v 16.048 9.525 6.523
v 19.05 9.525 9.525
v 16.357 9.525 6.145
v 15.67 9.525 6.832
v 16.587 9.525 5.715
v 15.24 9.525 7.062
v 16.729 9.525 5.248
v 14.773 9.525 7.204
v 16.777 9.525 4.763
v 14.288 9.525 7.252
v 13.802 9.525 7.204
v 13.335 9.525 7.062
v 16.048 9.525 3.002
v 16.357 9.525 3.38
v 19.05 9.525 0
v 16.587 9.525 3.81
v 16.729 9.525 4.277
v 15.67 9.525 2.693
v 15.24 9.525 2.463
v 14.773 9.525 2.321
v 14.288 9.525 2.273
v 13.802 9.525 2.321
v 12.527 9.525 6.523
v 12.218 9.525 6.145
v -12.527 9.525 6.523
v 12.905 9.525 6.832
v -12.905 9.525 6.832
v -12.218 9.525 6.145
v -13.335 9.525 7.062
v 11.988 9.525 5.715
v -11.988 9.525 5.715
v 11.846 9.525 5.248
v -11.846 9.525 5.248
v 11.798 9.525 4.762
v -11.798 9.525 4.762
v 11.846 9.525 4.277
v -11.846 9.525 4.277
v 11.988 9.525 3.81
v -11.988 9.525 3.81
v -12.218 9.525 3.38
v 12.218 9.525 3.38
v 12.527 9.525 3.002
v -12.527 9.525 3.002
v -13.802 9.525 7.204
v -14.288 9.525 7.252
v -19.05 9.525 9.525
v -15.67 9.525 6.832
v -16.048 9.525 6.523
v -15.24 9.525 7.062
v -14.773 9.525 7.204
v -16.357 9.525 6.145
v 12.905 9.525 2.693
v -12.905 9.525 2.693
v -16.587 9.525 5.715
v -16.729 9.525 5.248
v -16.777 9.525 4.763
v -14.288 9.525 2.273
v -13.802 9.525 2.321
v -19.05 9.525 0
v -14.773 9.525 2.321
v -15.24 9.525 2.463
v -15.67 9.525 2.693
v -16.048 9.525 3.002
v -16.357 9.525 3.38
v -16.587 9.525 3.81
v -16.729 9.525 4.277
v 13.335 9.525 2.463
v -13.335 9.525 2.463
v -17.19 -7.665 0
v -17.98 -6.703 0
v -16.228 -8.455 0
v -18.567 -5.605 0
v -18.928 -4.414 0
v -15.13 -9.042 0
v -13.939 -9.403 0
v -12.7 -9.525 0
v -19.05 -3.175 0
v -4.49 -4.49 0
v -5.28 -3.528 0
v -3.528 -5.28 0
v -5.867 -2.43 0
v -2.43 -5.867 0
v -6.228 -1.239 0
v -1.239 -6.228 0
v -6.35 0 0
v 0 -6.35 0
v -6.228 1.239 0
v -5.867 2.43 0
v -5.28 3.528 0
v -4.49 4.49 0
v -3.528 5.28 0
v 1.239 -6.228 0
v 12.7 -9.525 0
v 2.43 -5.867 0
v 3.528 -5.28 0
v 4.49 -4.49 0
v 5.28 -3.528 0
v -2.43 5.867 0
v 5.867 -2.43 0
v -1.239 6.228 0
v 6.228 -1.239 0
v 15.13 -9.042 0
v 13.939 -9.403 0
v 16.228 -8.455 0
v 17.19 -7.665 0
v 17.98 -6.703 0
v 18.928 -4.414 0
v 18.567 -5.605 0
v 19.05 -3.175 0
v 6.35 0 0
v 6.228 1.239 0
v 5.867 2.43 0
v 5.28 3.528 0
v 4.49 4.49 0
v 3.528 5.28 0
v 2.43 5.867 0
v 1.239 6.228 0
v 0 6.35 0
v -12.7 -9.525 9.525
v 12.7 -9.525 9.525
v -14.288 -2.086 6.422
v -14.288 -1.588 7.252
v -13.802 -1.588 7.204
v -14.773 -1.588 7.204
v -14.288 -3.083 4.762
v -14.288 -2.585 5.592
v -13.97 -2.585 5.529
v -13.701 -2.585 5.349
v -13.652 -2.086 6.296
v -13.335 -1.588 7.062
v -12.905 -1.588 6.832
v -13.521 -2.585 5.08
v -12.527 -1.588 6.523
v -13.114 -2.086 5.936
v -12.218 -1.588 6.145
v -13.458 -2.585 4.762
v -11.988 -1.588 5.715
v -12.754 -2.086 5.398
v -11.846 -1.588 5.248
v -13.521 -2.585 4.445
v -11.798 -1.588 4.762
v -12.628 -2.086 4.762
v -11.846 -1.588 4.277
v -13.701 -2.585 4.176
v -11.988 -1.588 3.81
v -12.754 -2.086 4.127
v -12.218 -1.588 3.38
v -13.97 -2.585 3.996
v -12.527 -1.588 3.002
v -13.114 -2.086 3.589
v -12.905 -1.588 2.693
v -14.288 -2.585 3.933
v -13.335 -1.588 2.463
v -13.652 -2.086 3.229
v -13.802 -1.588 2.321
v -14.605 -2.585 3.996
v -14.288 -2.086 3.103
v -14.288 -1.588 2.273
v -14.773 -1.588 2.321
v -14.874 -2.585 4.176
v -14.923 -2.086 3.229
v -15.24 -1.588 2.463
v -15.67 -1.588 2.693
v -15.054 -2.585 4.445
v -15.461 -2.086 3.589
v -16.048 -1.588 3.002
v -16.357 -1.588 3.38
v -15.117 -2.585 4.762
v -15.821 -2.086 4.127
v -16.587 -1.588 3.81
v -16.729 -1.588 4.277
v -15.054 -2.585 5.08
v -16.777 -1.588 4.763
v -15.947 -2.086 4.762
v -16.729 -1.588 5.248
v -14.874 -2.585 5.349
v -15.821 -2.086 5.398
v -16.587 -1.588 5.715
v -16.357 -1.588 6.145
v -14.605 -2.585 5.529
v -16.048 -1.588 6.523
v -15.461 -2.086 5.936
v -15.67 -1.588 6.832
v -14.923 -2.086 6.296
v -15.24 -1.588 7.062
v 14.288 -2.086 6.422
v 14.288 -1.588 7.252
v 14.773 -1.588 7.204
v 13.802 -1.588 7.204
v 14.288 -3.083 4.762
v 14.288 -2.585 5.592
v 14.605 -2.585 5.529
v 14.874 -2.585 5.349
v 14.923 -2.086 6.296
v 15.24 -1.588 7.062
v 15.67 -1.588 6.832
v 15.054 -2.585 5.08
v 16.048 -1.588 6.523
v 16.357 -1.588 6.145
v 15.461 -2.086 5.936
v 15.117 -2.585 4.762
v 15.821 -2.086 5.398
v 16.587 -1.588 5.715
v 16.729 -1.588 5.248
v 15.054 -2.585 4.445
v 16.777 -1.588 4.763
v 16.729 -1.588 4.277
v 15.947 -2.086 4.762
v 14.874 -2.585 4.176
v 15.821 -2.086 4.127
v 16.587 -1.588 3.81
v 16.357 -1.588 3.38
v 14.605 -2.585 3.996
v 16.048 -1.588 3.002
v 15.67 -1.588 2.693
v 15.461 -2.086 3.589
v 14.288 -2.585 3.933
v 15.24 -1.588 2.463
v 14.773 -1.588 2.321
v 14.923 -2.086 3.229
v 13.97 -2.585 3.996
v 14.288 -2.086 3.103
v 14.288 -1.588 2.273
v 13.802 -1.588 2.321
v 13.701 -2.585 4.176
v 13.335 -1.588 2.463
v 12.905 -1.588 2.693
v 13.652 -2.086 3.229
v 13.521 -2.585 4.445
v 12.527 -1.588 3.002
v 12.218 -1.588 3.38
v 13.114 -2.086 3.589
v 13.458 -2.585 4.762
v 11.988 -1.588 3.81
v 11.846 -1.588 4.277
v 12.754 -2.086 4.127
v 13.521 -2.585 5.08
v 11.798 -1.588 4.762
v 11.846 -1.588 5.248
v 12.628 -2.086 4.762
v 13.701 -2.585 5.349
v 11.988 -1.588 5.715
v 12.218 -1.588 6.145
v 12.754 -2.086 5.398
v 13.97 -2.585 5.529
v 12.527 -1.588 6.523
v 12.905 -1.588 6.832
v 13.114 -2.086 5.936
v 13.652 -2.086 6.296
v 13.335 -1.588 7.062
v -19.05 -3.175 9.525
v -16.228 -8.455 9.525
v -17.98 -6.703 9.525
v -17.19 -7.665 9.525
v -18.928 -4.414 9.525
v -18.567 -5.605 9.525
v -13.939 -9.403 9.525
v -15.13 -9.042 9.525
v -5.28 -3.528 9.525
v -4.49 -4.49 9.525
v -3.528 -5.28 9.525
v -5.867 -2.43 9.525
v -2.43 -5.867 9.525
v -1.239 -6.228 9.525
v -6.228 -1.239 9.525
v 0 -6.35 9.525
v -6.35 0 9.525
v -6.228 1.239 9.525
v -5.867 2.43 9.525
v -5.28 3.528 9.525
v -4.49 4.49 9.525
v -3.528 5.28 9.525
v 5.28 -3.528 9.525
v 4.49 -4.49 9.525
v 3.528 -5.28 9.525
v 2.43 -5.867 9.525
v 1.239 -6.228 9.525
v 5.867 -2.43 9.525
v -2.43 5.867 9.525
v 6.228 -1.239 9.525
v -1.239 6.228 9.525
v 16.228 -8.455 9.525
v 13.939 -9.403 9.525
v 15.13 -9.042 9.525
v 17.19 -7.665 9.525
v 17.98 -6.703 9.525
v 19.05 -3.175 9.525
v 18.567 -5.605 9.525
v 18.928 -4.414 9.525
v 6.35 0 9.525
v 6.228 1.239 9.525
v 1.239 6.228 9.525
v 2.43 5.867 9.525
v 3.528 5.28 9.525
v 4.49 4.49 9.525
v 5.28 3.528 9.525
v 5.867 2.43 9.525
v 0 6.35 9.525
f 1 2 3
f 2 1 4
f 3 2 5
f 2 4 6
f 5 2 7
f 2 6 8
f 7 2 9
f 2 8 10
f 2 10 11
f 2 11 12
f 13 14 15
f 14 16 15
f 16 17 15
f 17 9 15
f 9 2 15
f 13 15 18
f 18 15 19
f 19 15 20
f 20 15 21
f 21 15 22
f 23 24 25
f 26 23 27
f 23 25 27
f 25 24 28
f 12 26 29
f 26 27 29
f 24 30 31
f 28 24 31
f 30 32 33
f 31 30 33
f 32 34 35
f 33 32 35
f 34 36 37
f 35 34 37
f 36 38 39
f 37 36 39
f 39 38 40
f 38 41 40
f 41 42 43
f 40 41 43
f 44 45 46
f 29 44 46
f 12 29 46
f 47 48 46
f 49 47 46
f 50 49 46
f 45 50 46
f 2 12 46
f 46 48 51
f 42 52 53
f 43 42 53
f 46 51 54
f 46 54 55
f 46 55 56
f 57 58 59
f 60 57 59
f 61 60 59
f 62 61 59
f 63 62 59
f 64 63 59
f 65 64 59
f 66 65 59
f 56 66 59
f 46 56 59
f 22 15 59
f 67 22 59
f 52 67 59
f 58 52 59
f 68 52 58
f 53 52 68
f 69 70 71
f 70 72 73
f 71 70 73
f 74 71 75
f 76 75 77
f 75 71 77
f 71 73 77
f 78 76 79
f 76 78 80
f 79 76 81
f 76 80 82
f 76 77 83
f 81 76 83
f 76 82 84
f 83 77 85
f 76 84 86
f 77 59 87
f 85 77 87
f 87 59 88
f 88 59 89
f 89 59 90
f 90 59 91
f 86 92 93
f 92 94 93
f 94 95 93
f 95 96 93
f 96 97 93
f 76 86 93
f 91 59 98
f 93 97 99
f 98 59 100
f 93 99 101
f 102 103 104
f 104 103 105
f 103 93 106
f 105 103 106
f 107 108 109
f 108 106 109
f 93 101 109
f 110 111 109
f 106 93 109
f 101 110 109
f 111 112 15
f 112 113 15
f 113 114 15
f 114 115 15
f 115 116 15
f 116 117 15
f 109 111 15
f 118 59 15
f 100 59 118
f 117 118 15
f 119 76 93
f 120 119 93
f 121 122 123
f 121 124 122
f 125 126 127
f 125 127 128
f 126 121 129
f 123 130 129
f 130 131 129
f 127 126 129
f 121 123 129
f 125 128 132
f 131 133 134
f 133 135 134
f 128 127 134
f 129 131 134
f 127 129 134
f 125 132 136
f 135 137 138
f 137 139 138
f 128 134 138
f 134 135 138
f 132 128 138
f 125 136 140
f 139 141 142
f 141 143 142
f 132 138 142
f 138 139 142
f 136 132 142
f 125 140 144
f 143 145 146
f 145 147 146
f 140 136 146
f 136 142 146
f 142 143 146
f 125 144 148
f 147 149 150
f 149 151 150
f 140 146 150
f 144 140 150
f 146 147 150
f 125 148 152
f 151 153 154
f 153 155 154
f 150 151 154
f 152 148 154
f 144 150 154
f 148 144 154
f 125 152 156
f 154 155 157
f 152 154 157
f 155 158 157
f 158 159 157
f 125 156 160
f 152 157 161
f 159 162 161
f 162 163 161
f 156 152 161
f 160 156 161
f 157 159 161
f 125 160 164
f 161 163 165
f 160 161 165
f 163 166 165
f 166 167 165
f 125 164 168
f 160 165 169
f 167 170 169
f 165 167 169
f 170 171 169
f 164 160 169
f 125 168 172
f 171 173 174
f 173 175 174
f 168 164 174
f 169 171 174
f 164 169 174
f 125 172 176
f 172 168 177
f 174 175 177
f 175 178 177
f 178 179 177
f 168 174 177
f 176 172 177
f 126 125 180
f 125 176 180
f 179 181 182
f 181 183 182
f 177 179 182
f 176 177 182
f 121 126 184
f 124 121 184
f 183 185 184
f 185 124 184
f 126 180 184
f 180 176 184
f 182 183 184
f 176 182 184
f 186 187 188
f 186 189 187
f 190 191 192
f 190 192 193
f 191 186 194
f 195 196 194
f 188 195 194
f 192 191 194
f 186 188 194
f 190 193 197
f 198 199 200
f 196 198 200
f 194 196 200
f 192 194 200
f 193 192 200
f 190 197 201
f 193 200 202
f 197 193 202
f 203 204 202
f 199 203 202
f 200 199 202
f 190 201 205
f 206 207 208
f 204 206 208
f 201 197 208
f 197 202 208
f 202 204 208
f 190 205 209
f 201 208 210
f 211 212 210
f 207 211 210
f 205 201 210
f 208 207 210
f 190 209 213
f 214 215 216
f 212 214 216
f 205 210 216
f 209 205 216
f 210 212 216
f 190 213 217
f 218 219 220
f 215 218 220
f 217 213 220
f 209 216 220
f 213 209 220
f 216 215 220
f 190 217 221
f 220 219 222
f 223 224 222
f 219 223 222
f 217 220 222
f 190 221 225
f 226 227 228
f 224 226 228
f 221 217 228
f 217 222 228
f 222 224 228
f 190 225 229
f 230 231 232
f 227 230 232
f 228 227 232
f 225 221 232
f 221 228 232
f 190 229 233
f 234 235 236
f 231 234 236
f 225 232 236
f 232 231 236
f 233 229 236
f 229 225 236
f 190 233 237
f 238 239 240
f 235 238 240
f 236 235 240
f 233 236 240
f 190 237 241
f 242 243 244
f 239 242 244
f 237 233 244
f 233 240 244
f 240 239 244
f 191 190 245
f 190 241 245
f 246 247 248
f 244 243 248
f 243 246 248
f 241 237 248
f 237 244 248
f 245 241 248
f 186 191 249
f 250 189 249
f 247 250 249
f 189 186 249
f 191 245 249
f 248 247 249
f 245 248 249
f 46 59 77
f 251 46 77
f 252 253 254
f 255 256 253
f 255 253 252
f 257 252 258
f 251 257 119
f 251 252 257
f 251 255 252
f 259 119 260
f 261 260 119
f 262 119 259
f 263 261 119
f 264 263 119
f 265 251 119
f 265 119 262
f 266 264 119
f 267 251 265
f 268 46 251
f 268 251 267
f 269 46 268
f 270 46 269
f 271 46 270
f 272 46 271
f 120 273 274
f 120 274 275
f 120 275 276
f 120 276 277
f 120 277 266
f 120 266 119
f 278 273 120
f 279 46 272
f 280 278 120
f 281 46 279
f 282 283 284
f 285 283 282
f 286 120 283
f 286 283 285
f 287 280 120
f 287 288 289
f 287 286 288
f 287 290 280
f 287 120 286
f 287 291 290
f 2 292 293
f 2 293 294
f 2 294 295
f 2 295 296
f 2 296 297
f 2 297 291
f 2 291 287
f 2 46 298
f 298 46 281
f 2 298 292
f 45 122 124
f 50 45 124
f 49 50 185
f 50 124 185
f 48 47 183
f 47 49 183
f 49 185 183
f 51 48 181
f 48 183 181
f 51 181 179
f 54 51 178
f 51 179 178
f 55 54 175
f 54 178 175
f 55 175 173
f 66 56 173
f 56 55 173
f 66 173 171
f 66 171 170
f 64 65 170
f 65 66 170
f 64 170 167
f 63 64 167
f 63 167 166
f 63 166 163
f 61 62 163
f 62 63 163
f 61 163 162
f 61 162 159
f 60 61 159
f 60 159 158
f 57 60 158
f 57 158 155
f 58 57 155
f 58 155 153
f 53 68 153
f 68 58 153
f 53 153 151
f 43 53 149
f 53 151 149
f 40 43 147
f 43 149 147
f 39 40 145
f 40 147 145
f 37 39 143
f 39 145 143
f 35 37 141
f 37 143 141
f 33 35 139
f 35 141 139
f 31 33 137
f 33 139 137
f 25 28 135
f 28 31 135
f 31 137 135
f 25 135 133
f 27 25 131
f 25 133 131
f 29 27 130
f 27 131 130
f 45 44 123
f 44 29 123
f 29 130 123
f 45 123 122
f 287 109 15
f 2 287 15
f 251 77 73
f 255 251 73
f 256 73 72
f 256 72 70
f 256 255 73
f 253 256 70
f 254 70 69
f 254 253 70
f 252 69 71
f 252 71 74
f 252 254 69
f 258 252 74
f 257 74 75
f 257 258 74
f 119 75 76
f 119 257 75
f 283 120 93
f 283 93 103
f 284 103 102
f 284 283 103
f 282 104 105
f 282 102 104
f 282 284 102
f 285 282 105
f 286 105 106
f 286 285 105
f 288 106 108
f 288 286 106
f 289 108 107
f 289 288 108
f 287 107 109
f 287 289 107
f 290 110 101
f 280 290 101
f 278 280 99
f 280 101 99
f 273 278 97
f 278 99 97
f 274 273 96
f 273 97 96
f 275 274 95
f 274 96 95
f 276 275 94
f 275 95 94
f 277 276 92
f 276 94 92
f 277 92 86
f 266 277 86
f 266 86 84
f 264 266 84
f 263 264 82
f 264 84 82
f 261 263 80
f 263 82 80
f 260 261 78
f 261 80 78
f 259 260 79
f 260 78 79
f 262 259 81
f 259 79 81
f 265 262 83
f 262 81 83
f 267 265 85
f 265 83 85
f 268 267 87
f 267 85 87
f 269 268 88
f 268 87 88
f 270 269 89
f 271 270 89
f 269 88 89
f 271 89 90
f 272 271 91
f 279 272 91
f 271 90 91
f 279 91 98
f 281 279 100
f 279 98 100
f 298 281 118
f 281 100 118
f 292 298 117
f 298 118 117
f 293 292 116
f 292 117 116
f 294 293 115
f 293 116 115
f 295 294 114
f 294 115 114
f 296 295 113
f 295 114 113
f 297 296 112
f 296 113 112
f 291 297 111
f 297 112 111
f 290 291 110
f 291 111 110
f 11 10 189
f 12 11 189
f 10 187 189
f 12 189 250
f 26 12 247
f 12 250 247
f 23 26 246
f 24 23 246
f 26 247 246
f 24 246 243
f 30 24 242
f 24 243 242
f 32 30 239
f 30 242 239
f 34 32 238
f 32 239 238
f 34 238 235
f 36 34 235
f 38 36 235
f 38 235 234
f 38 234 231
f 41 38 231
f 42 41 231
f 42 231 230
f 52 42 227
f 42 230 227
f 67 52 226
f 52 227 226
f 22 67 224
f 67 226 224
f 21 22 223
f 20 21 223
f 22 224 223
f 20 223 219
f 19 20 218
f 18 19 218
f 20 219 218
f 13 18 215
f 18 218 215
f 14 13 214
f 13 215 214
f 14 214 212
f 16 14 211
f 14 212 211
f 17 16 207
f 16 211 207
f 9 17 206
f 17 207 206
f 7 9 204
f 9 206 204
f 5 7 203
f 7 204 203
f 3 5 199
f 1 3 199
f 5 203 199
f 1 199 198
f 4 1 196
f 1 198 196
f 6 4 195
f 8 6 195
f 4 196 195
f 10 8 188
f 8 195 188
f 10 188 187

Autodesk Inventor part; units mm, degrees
ref_plane "YZ Plane" through (0, 0, 0) normal (1, 0, 0) x (0, 1, 0)
ref_plane "XZ Plane" through (0, 0, 0) normal (0, 1, 0) x (-1, 0, 0)
ref_plane "XY Plane" through (0, 0, 0) normal (0, 0, 1) x (1, 0, 0)
sketch "Sketch1" plane through (0, 0, 0) normal (0, 0, 1) x (1, 0, 0)
  circle A0 centre (0, 0) radius 6.35
  arc A1 (0, 9.525) -> (0, -9.525) centre (0, 0) ccw
  line L0 (0, -9.525) -> (19.05, -9.525)
  line L1 (19.05, -9.525) -> (19.05, 9.525)
  line L2 (19.05, 9.525) -> (0, 9.525)
  dimension "d0" = 12.7
  dimension "d1" = 19.05
  dimension "d2" = 19.05
  dimension "d3" = 19.05
extrude "Extrusion1" add sketch "Sketch1" along normal blind 9.525
fillet "Fillet1" radius 6.35 1 edges at (19.05, -9.525, 4.7625)
sketch "Sketch2" plane through (0, 9.525, 0) normal (0, 1, 0) x (1, 0, 0)
  line L0 (0, 0) -> (19.05, 0) projected
  line L1 (0, 0) -> (0, -9.525) projected
  line L2 (19.05, -9.525) -> (0, -9.525) projected
  line L3 (19.05, 0) -> (19.05, -9.525) projected
  line L4 (6.35, 0) -> (6.35, -9.525) projected
  point P0 (0, 0)
  point P1 (14.2875, -4.7625)
  dimension "d7" = 4.7625
  dimension "d9" = 9.525
  dimension "d17" = 7.9375
hole "Hole1" at (14.2875, 9.525, 4.7625) direction (0, -1, 0) diameter 4.9784 depth 11.1125 tip angle 118 thread size "1/4-20 UNC" class "2B" standard "ANSI Unified Screw Threads"
mirror "Mirror1" about plane through (0, 0, 0) normal (1, 0, 0) of "Extrusion1", "Hole1", "Fillet1"
equation "\"d7\" = 0.5 * d9"
properties part number "WheelSuspensionHub" material "Aluminum 6061"
